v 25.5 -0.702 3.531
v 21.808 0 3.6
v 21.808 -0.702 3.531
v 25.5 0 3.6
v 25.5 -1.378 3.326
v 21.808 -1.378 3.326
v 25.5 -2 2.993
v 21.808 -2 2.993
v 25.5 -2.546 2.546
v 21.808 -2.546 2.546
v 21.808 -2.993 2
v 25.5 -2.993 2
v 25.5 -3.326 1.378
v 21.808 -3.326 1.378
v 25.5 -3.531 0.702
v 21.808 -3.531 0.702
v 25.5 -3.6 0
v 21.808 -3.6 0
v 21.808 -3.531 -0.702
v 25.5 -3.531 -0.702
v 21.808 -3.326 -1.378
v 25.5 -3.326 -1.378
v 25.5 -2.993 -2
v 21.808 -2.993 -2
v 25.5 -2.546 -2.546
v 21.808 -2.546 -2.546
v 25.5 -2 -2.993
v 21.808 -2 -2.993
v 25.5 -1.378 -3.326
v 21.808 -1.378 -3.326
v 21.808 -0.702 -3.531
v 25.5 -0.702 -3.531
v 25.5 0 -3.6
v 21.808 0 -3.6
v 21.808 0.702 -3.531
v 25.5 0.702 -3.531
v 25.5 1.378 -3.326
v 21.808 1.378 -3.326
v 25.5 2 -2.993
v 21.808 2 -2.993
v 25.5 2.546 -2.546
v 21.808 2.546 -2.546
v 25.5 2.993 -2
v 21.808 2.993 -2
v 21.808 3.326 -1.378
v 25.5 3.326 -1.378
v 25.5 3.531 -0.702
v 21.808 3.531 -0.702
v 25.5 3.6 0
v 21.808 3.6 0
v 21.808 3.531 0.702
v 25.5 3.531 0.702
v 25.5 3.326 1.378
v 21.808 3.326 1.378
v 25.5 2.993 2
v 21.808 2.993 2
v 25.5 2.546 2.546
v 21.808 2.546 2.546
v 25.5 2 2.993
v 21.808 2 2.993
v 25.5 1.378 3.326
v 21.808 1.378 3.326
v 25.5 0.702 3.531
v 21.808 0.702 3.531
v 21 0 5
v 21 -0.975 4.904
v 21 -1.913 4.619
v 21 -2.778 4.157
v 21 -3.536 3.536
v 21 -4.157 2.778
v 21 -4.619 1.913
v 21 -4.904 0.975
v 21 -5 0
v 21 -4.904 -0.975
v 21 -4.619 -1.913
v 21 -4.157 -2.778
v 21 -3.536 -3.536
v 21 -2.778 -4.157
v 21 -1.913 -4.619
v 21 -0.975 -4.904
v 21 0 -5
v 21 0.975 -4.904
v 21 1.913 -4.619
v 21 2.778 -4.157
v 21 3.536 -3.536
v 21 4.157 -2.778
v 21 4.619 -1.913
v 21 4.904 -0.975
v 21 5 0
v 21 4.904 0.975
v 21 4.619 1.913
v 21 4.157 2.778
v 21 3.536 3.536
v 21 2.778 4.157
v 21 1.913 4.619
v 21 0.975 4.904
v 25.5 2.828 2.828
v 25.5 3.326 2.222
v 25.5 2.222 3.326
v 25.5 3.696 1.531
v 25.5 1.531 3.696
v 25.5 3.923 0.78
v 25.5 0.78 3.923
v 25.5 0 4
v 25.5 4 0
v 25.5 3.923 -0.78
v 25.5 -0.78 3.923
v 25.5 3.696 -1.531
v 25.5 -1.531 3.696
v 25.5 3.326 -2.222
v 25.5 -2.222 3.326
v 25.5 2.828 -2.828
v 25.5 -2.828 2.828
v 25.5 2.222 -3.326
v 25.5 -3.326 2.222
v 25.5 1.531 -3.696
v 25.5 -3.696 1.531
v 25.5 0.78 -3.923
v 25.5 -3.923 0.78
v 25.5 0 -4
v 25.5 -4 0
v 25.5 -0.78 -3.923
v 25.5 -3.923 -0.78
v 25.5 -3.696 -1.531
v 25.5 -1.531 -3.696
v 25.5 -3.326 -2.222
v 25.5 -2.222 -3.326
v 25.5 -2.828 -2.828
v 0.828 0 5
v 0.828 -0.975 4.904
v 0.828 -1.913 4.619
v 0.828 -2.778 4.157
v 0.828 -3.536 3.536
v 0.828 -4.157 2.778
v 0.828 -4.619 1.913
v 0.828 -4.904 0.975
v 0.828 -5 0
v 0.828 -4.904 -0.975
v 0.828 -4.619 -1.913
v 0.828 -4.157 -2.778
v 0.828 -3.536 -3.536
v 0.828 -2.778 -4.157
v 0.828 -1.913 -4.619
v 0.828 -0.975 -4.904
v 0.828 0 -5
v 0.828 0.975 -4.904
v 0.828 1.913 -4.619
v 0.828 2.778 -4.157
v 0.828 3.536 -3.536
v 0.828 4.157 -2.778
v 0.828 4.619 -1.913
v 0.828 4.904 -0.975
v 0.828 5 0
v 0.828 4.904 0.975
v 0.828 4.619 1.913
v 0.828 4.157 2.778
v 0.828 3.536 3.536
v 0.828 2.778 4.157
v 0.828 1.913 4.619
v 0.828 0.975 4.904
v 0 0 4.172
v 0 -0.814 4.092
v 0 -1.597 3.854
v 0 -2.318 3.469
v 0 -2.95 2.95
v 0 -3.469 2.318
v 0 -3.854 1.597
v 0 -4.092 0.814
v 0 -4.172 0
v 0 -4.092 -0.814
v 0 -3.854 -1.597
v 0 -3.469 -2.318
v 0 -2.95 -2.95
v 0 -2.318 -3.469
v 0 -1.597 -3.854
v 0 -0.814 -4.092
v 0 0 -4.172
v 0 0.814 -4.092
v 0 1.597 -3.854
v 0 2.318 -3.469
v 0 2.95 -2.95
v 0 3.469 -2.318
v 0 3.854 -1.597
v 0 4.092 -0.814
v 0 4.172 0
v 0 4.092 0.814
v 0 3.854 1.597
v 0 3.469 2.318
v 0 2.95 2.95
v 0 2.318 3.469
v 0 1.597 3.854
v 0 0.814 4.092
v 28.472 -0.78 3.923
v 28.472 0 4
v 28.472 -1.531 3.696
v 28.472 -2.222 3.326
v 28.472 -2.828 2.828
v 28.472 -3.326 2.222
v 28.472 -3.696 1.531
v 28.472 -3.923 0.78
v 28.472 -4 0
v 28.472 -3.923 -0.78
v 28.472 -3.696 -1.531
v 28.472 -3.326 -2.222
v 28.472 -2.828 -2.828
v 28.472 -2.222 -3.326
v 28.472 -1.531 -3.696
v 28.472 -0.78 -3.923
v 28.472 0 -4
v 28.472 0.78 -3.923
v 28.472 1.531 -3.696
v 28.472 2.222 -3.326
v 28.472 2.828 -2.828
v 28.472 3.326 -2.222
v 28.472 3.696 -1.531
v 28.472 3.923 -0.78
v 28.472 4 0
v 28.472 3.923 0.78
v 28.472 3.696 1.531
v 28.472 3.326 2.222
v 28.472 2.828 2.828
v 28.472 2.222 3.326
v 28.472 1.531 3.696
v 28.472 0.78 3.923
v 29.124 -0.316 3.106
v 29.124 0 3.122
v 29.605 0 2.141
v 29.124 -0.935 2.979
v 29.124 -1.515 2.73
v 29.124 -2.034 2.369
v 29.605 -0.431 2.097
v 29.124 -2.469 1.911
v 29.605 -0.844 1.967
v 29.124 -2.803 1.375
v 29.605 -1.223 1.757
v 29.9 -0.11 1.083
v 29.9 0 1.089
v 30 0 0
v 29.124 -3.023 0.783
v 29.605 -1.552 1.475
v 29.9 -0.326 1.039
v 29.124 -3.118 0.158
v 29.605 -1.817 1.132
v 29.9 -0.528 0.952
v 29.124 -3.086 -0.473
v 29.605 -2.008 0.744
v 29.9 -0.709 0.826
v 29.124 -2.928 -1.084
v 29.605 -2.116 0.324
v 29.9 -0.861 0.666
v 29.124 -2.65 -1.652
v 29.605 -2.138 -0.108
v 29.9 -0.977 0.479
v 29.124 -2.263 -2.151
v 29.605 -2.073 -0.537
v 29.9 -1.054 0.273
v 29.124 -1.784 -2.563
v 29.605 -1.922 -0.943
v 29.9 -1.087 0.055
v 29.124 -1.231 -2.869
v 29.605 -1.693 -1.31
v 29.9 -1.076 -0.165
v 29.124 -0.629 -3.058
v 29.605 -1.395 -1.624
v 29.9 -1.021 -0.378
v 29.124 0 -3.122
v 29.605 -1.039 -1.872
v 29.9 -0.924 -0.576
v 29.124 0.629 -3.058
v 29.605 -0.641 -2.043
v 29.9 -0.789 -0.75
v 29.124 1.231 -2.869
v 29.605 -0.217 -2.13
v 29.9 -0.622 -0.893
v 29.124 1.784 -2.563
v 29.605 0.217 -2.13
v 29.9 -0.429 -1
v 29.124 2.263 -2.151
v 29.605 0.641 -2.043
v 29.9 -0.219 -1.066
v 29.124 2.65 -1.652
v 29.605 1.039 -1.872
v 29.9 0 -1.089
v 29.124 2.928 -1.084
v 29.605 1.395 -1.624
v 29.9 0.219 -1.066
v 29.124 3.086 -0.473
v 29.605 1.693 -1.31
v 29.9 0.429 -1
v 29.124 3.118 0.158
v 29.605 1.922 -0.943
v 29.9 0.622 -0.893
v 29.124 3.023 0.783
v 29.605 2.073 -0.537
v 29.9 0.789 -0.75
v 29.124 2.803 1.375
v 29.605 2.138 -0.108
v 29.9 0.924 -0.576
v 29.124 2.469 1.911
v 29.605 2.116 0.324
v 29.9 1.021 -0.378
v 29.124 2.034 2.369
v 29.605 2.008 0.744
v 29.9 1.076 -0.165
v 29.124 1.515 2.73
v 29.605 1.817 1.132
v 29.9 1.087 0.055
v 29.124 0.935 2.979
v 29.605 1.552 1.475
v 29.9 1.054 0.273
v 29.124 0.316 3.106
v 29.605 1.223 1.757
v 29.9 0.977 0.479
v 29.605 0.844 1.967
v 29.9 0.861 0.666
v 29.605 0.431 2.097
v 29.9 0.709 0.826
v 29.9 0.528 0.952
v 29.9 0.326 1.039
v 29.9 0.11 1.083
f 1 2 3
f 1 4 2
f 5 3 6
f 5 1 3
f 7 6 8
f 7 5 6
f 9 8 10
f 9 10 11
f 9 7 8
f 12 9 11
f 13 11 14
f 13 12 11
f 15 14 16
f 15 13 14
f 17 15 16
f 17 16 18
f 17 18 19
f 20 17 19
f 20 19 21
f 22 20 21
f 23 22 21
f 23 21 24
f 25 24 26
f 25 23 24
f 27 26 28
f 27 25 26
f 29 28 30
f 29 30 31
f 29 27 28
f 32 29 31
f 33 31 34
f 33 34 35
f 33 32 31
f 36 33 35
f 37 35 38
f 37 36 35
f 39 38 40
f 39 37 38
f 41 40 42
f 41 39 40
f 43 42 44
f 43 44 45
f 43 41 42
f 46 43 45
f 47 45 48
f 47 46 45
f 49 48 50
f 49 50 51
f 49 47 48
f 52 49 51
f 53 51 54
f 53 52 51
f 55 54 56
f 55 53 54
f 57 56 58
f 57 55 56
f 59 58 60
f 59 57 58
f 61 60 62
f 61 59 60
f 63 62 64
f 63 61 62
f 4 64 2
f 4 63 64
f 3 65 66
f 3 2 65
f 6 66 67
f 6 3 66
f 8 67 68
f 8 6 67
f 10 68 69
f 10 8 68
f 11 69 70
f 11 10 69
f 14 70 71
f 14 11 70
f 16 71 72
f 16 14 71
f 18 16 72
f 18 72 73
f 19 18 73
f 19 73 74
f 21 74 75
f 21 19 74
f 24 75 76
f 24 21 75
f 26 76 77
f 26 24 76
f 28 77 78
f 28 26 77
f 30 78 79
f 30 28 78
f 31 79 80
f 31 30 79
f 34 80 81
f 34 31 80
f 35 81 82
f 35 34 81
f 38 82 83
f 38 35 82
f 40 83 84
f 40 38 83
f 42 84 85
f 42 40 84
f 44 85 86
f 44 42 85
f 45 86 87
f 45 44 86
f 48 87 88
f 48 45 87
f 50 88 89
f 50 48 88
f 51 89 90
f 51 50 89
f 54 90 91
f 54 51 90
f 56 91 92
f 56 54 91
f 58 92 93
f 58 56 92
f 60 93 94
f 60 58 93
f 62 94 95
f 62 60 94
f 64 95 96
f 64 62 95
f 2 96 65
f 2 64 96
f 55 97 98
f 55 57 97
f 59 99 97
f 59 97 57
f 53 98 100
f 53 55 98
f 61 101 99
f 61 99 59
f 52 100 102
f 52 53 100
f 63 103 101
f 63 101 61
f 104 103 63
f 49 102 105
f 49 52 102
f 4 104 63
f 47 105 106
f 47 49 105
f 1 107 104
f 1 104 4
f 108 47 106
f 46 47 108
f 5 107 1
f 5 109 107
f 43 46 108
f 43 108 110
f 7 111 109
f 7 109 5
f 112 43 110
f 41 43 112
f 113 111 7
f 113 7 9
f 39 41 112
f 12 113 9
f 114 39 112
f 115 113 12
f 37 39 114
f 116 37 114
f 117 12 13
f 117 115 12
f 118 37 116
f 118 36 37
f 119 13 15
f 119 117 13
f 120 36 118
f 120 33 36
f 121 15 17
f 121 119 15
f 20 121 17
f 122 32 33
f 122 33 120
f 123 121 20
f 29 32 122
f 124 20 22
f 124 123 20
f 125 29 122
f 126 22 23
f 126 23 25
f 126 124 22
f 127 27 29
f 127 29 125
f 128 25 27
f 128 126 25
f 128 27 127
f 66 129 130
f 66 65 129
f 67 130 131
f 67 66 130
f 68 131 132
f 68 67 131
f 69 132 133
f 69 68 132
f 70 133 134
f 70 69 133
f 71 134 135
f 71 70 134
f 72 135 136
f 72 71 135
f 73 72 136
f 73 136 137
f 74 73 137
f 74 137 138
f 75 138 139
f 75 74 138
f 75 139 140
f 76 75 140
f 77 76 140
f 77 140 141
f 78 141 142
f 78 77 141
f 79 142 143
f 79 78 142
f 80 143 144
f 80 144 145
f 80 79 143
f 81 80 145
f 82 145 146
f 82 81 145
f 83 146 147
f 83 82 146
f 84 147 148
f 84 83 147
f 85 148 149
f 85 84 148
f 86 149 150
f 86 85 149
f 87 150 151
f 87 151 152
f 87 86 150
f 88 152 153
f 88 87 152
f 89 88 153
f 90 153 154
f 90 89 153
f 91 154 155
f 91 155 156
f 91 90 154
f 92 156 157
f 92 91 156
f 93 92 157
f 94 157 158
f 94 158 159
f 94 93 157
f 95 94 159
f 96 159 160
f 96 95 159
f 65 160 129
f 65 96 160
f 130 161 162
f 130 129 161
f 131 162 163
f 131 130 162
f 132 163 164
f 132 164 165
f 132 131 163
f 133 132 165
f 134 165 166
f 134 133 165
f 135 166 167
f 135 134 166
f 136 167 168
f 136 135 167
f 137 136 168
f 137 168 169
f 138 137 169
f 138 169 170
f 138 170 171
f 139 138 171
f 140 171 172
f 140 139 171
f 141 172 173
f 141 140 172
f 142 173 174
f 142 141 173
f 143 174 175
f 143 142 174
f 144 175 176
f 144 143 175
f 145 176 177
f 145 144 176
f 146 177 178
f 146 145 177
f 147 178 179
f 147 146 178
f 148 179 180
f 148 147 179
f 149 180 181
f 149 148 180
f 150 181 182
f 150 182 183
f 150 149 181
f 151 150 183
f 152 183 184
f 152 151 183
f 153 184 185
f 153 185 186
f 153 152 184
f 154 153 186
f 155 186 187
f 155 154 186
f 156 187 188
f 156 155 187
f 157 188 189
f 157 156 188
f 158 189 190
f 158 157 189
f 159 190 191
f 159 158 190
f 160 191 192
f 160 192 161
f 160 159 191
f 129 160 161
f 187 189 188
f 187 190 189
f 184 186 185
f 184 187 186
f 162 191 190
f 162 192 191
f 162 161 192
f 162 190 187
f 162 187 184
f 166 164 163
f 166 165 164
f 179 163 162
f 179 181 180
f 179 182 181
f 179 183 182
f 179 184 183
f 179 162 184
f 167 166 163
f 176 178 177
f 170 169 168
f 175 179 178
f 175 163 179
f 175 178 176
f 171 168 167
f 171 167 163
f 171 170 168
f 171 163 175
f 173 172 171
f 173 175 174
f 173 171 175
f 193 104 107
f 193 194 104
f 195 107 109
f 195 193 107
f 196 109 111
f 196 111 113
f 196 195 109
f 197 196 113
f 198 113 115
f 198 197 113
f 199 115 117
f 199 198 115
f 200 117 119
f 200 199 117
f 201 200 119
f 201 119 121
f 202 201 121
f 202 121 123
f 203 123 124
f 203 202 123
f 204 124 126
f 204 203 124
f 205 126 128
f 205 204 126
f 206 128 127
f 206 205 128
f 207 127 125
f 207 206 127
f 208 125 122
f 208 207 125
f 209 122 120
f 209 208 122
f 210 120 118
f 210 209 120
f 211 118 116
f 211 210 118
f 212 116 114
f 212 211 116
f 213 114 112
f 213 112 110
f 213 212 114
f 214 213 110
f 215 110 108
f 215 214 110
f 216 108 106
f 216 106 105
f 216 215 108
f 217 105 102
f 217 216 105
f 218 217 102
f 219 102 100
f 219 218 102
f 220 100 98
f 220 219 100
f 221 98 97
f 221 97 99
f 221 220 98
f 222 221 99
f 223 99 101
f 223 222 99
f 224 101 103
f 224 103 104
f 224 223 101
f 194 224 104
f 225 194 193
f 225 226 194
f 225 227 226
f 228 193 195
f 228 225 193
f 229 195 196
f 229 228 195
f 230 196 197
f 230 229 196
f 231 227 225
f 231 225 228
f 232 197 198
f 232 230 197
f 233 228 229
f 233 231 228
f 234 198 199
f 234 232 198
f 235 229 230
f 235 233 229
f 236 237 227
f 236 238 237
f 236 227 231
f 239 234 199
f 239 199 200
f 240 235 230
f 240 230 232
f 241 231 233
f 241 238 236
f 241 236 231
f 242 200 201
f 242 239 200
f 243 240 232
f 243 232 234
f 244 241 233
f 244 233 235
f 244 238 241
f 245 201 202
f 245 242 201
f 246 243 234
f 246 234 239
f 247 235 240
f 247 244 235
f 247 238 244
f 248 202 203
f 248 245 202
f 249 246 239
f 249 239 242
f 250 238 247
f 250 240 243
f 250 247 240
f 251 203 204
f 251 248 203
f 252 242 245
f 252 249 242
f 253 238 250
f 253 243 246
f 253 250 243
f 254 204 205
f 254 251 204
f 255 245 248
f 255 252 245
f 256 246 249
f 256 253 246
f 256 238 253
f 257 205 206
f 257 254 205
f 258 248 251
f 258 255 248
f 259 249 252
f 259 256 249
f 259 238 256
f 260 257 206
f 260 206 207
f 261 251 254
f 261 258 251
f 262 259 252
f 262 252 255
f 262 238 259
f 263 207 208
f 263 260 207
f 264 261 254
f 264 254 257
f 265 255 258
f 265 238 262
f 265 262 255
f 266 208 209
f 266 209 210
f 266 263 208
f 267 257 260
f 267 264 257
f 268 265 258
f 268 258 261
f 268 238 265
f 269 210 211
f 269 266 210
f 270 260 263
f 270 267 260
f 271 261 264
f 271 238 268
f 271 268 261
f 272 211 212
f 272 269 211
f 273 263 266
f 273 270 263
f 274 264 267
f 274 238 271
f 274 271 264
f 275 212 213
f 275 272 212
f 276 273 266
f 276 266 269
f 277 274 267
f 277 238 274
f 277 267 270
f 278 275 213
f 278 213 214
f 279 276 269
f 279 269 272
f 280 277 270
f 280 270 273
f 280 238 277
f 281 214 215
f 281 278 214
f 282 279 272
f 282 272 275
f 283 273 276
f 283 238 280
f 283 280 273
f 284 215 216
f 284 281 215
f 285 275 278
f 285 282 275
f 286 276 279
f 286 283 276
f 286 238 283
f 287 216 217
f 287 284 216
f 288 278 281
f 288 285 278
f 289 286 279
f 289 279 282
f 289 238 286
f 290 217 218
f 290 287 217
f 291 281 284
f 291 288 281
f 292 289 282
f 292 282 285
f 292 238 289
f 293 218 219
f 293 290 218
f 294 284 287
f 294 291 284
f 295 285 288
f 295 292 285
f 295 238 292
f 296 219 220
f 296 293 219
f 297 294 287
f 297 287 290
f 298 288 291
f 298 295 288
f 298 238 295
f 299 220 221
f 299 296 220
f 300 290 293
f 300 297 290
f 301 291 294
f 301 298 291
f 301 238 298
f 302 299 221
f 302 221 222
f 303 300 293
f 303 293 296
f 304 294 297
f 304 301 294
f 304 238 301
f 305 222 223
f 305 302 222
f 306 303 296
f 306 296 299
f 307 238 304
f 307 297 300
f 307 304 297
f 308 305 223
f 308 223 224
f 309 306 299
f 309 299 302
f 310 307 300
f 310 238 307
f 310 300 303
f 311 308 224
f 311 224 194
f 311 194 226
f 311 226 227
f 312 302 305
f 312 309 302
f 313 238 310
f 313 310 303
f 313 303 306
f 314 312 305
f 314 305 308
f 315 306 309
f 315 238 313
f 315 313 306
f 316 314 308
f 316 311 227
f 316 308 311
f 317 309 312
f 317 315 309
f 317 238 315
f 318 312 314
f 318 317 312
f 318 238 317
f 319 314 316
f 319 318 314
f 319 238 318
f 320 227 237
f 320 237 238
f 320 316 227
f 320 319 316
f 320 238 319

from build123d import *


with BuildPart() as part:
    # BodySke → BaseBody (revolve)
    with BuildSketch(Plane.XY, mode=Mode.PRIVATE) as basebody_sk:
        with BuildLine():
            Line((21.808290377, 3.6), (25.5, 3.6))
            Line((25.5, 3.6), (25.5, 4))
            Line((25.5, 4), (28.472135955, 4))
            ThreePointArc((28.472135955, 4), (29.605034154, 2.140932539), (30, 0))
            Line((30, 0), (0, 0))
            Line((0, 0), (0, 4.172))
            Line((0, 4.172), (0.828, 5))
            Line((0.828, 5), (21, 5))
            Line((21, 5), (21.808290377, 3.6))
        make_face()
    revolve(basebody_sk.sketch.rotate(Axis((-3.175, 0, 0), (1, 0, 0)), 90), axis=Axis((-3.175, 0, 0), (1, 0, 0)))


solid = part.part
